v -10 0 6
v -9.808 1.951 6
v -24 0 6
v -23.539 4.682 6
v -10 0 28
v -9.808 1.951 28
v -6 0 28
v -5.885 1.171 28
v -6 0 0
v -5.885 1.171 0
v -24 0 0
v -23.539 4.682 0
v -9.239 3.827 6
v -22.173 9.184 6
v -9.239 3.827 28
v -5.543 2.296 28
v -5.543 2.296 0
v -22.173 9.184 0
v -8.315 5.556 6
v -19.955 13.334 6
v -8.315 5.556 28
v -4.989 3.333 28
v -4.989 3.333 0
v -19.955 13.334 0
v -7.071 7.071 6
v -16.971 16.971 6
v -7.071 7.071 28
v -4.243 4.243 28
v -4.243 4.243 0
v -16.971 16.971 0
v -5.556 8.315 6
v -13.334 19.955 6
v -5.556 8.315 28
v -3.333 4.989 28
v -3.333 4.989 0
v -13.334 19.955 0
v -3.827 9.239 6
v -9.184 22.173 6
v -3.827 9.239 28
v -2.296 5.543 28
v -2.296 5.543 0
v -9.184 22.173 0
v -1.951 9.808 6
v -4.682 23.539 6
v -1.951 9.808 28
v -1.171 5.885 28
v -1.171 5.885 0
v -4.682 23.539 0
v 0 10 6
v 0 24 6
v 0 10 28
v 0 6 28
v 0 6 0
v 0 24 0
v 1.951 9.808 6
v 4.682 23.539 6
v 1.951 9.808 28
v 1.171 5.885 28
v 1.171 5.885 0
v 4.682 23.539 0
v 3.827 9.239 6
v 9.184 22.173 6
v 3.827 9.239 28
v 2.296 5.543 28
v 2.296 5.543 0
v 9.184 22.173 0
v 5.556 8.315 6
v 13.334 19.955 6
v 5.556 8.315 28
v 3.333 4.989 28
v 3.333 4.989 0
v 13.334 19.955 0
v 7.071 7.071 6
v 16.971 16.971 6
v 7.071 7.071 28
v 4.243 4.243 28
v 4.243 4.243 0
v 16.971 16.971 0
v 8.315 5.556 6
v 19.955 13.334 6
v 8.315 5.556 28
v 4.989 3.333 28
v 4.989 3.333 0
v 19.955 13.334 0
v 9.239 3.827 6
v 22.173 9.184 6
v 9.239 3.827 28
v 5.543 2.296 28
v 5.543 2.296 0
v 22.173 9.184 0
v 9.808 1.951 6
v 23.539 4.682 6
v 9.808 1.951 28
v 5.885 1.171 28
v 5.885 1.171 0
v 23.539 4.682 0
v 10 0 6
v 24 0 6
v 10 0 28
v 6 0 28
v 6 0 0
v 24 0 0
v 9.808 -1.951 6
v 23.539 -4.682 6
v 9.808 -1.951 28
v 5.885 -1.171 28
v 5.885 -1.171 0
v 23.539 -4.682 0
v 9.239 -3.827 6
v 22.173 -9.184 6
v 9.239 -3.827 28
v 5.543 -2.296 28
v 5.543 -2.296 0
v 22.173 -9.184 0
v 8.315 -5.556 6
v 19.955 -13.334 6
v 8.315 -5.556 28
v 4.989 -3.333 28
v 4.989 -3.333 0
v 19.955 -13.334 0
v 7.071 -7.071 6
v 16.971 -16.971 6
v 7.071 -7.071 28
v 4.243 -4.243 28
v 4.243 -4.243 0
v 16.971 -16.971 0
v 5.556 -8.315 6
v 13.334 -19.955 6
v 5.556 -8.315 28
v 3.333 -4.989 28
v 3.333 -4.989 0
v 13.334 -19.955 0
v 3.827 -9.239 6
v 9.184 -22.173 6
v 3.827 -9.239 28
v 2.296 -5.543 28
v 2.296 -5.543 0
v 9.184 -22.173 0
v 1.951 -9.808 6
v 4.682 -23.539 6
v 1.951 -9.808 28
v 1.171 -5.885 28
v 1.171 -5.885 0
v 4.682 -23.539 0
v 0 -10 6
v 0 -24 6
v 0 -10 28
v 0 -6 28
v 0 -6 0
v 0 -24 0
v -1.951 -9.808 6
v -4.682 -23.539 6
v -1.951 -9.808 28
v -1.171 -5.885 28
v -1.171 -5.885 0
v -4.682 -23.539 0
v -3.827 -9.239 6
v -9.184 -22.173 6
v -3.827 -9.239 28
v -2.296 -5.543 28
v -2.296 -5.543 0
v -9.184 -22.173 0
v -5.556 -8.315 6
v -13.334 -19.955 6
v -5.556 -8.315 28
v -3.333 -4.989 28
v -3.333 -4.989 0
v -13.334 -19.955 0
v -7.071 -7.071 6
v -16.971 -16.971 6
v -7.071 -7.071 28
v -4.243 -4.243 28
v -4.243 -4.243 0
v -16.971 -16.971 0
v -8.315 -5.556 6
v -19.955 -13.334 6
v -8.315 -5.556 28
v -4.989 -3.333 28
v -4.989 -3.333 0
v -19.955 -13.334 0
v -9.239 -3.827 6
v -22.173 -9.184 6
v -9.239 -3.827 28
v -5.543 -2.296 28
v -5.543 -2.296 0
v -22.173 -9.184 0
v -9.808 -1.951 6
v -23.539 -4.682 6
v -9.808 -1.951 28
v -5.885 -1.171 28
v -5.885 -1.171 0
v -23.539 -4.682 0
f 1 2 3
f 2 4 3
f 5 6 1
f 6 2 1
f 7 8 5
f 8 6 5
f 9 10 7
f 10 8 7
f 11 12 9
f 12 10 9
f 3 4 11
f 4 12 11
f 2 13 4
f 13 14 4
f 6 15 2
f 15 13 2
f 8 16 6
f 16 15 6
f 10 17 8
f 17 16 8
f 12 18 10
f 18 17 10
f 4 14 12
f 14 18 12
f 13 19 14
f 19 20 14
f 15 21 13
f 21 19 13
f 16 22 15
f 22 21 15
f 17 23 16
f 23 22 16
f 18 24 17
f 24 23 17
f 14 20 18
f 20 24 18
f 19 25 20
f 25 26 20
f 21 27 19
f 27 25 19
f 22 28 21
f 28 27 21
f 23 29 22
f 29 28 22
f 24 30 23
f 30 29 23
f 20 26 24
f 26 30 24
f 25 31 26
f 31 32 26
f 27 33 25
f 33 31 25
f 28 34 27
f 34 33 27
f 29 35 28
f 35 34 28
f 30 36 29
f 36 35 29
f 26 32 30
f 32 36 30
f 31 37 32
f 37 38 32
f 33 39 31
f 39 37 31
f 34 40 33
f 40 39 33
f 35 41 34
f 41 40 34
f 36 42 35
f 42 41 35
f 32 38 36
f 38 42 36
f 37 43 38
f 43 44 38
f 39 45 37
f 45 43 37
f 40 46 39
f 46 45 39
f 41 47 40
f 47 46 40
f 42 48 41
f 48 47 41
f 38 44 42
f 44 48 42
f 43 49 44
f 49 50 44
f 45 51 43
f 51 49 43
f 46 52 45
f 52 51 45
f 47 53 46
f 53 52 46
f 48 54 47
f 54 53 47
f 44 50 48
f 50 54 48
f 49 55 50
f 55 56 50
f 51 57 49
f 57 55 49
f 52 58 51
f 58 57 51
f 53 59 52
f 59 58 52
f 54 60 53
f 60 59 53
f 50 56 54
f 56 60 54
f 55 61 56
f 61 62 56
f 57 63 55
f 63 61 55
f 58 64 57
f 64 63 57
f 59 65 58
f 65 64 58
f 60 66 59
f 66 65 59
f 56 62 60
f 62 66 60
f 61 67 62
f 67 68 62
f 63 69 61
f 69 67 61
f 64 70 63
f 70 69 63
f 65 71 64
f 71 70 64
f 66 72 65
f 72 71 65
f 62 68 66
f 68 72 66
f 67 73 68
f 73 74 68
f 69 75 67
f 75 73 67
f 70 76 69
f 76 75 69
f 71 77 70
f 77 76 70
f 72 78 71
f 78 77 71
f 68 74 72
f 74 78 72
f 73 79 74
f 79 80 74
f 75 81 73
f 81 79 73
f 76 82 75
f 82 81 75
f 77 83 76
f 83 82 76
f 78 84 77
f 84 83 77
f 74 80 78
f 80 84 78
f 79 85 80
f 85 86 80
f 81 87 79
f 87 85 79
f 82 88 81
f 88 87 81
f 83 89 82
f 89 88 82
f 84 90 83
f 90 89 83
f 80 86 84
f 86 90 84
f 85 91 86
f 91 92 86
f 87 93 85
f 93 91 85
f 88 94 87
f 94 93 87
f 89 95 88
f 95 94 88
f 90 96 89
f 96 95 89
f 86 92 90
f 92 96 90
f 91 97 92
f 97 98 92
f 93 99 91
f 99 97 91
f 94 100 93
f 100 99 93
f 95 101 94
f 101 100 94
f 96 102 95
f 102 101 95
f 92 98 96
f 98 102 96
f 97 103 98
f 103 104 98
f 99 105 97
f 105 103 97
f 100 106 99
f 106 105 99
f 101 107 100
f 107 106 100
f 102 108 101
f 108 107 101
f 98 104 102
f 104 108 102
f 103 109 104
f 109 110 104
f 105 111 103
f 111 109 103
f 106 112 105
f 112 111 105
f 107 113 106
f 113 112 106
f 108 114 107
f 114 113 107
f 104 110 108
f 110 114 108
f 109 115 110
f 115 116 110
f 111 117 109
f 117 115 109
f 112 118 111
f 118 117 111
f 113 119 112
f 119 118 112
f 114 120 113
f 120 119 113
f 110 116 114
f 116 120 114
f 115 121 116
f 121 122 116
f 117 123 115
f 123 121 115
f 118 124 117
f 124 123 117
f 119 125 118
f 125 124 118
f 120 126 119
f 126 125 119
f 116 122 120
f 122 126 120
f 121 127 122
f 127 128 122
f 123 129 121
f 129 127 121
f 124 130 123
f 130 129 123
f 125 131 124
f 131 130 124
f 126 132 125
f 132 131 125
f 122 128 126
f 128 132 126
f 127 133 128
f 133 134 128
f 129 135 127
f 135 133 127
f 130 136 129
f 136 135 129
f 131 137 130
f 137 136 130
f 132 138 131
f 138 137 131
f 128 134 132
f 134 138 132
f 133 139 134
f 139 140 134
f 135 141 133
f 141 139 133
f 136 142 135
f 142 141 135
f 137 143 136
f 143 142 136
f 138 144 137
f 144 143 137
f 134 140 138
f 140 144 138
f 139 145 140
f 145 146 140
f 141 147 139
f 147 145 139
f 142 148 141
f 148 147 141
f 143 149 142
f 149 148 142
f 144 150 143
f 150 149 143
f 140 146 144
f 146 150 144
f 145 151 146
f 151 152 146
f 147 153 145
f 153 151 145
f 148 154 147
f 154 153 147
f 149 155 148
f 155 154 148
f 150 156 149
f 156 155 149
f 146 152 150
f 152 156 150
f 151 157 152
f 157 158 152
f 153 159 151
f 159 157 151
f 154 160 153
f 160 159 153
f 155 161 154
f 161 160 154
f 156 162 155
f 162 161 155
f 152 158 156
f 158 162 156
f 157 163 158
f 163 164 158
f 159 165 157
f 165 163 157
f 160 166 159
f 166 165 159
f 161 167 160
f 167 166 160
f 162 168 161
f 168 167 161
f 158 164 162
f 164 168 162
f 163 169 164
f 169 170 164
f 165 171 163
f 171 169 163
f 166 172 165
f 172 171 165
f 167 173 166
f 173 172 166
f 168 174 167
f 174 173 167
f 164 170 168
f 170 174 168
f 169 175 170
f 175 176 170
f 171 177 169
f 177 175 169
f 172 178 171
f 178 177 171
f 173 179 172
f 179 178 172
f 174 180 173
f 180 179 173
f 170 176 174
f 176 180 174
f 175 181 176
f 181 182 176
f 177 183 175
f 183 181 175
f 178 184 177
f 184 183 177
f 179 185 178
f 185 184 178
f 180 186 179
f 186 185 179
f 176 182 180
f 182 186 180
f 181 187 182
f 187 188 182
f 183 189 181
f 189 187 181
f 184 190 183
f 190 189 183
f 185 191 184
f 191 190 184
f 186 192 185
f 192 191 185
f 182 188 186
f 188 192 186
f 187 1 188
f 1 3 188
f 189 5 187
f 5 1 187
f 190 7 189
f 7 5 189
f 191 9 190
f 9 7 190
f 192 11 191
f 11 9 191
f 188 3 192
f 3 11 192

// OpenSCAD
$fn = 32;

// ----------------------------------------------------------------------
// Revolved part: flanged bushing R24
// ----------------------------------------------------------------------

// --- parameters (mm) ---
bore_r = 6;               // bore radius
flange_r = 24;            // flange radius
flange_h = 6;             // flange thickness
sleeve_r = 10;            // sleeve radius
total_h = 28;             // overall height
revolve_angle = 360;      // revolve sweep, degrees

bore_d = 2 * bore_r;
flange_d = 2 * flange_r;
sleeve_d = 2 * sleeve_r;

profile = [[6, 0], [24, 0], [24, 6], [10, 6], [10, 28], [6, 28]];  // primary outline, 6 points, counter clockwise

// --- the one profile operation ---
rotate_extrude(angle = revolve_angle) polygon(points = profile);
